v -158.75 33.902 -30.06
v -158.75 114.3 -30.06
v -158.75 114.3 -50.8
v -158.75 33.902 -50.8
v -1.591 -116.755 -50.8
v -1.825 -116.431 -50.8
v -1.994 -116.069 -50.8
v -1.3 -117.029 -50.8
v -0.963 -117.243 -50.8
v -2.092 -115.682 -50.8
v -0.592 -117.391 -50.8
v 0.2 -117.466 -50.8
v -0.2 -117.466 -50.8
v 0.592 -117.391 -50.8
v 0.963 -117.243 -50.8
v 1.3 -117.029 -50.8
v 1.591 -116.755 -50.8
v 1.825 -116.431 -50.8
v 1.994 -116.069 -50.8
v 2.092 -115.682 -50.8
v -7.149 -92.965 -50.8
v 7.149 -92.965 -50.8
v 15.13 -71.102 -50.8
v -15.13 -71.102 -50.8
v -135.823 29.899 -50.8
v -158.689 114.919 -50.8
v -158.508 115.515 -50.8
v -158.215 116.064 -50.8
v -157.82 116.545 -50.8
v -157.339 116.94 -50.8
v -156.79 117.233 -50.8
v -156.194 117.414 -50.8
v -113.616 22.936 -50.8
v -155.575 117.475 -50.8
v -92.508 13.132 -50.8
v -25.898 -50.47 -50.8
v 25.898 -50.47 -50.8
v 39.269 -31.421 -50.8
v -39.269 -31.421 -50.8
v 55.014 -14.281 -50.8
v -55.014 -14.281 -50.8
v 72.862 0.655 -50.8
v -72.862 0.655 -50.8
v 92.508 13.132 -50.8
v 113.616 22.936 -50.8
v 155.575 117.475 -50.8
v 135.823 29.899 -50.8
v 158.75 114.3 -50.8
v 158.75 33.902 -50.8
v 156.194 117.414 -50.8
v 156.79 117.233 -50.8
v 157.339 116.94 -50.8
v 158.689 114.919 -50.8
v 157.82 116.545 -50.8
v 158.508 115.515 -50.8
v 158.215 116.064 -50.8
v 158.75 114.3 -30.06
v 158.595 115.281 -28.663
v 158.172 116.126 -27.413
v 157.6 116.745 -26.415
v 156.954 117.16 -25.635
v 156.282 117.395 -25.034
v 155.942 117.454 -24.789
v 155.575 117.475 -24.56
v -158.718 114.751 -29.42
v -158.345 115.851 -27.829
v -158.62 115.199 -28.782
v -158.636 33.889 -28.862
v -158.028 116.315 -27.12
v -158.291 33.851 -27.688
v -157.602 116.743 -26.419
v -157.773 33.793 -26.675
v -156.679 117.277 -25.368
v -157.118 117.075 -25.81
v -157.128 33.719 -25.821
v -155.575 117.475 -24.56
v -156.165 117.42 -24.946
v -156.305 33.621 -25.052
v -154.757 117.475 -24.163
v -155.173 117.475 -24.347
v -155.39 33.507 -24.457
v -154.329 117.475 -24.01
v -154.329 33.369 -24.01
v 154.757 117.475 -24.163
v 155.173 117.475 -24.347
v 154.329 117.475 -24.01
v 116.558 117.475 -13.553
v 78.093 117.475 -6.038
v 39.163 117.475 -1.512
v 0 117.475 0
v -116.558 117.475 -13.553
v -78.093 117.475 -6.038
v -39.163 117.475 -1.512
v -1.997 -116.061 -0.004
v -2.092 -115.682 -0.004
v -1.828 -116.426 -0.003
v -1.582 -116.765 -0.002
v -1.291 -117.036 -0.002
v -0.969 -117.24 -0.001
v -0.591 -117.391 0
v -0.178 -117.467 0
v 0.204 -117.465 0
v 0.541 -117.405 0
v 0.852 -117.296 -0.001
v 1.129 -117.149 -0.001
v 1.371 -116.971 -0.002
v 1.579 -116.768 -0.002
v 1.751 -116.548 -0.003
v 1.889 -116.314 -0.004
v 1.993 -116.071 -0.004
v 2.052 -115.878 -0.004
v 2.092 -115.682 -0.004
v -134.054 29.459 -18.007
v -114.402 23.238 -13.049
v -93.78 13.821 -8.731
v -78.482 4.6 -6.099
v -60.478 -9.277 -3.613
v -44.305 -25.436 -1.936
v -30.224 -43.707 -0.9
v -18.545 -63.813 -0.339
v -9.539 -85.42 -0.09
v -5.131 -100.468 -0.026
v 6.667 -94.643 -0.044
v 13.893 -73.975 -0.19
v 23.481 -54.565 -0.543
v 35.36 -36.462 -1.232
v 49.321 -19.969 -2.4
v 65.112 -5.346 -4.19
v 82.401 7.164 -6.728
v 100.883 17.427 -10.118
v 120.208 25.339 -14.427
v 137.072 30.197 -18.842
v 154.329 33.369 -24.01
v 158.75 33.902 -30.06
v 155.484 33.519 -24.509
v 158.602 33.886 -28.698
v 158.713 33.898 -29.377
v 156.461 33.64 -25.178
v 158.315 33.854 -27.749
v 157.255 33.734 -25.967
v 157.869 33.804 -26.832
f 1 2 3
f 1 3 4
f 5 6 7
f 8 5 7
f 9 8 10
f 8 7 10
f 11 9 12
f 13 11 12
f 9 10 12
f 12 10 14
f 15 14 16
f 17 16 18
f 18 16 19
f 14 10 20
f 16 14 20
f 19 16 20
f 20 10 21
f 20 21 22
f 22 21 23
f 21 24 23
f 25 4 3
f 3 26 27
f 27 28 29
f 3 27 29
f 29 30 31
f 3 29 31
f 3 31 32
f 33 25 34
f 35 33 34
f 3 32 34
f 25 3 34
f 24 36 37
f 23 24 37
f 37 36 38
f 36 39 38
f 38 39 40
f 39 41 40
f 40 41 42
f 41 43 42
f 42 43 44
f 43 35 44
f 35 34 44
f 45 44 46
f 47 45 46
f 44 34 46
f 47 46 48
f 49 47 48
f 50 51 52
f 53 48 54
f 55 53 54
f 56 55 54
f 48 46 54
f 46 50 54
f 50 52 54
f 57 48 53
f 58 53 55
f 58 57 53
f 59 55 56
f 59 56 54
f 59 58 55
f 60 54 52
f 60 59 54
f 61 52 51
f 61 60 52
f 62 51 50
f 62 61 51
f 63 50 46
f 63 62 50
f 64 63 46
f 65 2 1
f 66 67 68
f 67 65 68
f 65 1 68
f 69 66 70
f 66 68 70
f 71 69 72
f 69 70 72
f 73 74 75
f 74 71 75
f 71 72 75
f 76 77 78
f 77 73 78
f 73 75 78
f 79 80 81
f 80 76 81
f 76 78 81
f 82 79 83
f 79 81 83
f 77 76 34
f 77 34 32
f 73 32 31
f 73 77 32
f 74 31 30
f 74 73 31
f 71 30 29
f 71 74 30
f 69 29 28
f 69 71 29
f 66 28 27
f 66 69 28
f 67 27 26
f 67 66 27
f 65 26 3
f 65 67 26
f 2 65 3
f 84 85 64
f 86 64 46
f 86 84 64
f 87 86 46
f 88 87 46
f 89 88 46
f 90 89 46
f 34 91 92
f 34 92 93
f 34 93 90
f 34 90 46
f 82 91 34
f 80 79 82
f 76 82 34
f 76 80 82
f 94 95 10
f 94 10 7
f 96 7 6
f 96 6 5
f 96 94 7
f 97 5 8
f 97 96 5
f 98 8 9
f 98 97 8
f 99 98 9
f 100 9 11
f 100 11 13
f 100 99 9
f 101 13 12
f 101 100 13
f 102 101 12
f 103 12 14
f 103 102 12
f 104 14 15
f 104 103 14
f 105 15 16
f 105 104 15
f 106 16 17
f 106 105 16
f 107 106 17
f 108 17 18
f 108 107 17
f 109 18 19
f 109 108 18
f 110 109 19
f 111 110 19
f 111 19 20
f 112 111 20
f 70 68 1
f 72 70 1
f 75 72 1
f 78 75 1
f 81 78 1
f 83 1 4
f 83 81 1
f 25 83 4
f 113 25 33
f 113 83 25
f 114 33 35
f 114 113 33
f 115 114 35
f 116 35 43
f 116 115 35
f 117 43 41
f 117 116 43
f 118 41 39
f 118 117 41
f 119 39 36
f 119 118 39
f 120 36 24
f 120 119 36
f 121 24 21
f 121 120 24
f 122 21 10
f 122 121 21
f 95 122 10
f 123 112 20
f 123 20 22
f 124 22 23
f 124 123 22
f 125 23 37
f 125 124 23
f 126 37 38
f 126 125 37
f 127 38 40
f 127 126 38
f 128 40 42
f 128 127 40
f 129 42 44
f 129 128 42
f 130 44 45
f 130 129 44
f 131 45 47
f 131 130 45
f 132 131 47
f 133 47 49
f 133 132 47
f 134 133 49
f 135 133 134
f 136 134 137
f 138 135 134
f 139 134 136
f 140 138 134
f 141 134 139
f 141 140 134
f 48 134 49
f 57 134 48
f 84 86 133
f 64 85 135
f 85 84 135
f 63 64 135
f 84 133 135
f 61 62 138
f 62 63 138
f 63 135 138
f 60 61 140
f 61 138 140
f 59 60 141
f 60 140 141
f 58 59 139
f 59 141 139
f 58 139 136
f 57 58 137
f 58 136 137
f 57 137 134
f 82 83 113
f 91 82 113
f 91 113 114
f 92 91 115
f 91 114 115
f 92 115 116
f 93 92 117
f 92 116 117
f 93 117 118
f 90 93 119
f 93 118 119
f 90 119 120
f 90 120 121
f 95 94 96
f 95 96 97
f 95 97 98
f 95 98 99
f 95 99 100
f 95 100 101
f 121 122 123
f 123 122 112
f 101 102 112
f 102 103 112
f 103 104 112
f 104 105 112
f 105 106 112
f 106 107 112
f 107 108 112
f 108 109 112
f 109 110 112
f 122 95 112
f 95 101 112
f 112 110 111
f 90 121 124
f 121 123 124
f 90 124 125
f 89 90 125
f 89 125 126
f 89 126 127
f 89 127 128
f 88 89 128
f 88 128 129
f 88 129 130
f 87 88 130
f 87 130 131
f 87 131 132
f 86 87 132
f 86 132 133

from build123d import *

# Parameters (mm, degrees)
F1_DEPTH = 50.8
F2_W     = 342.9
F2_H     = 76.2
F3_DEPTH = 127


with BuildPart() as f1:
    # F0 (on Top) → F1 (new body)
    with BuildSketch(Plane.XY):
        with BuildLine():
            Line((155.575, 117.475), (-155.575, 117.475))
            ThreePointArc((-155.575, 117.475), (-157.820064, 116.545064), (-158.75, 114.3))
            Line((-158.75, 114.3), (-158.75, 33.901519))
            ThreePointArc((-158.75, 33.901519), (-55.013583, -14.281315), (-2.091765, -115.682059))
            ThreePointArc((-2.091765, -115.682059), (0, -117.475), (2.091765, -115.682059))
            ThreePointArc((2.091765, -115.682059), (55.013583, -14.281315), (158.75, 33.901519))
            Line((158.75, 33.901519), (158.75, 114.3))
            ThreePointArc((158.75, 114.3), (157.820064, 116.545064), (155.575, 117.475))
        make_face()
    extrude(amount=-F1_DEPTH)

    # F2 (on Front) → F3 (cut, symmetric)
    with BuildSketch(Plane.XZ):
        with Locations((0, -25.4)):
            Rectangle(F2_W, F2_H)
        with BuildLine():
            Line((158.75, -50.8), (-158.75, -50.8))
            Line((-158.75, -50.8), (-158.75, -30.059666))
            ThreePointArc((-158.75, -30.059666), (-157.527006, -26.31316), (-154.329114, -24.009789))
            ThreePointArc((-154.329114, -24.009789), (0, 0), (154.329114, -24.009789))
            ThreePointArc((154.329114, -24.009789), (157.527006, -26.31316), (158.75, -30.059666))
            Line((158.75, -30.059666), (158.75, -50.8))
        make_face(mode=Mode.SUBTRACT)
    extrude(amount=F3_DEPTH, both=True, mode=Mode.SUBTRACT)


solid = f1.part
